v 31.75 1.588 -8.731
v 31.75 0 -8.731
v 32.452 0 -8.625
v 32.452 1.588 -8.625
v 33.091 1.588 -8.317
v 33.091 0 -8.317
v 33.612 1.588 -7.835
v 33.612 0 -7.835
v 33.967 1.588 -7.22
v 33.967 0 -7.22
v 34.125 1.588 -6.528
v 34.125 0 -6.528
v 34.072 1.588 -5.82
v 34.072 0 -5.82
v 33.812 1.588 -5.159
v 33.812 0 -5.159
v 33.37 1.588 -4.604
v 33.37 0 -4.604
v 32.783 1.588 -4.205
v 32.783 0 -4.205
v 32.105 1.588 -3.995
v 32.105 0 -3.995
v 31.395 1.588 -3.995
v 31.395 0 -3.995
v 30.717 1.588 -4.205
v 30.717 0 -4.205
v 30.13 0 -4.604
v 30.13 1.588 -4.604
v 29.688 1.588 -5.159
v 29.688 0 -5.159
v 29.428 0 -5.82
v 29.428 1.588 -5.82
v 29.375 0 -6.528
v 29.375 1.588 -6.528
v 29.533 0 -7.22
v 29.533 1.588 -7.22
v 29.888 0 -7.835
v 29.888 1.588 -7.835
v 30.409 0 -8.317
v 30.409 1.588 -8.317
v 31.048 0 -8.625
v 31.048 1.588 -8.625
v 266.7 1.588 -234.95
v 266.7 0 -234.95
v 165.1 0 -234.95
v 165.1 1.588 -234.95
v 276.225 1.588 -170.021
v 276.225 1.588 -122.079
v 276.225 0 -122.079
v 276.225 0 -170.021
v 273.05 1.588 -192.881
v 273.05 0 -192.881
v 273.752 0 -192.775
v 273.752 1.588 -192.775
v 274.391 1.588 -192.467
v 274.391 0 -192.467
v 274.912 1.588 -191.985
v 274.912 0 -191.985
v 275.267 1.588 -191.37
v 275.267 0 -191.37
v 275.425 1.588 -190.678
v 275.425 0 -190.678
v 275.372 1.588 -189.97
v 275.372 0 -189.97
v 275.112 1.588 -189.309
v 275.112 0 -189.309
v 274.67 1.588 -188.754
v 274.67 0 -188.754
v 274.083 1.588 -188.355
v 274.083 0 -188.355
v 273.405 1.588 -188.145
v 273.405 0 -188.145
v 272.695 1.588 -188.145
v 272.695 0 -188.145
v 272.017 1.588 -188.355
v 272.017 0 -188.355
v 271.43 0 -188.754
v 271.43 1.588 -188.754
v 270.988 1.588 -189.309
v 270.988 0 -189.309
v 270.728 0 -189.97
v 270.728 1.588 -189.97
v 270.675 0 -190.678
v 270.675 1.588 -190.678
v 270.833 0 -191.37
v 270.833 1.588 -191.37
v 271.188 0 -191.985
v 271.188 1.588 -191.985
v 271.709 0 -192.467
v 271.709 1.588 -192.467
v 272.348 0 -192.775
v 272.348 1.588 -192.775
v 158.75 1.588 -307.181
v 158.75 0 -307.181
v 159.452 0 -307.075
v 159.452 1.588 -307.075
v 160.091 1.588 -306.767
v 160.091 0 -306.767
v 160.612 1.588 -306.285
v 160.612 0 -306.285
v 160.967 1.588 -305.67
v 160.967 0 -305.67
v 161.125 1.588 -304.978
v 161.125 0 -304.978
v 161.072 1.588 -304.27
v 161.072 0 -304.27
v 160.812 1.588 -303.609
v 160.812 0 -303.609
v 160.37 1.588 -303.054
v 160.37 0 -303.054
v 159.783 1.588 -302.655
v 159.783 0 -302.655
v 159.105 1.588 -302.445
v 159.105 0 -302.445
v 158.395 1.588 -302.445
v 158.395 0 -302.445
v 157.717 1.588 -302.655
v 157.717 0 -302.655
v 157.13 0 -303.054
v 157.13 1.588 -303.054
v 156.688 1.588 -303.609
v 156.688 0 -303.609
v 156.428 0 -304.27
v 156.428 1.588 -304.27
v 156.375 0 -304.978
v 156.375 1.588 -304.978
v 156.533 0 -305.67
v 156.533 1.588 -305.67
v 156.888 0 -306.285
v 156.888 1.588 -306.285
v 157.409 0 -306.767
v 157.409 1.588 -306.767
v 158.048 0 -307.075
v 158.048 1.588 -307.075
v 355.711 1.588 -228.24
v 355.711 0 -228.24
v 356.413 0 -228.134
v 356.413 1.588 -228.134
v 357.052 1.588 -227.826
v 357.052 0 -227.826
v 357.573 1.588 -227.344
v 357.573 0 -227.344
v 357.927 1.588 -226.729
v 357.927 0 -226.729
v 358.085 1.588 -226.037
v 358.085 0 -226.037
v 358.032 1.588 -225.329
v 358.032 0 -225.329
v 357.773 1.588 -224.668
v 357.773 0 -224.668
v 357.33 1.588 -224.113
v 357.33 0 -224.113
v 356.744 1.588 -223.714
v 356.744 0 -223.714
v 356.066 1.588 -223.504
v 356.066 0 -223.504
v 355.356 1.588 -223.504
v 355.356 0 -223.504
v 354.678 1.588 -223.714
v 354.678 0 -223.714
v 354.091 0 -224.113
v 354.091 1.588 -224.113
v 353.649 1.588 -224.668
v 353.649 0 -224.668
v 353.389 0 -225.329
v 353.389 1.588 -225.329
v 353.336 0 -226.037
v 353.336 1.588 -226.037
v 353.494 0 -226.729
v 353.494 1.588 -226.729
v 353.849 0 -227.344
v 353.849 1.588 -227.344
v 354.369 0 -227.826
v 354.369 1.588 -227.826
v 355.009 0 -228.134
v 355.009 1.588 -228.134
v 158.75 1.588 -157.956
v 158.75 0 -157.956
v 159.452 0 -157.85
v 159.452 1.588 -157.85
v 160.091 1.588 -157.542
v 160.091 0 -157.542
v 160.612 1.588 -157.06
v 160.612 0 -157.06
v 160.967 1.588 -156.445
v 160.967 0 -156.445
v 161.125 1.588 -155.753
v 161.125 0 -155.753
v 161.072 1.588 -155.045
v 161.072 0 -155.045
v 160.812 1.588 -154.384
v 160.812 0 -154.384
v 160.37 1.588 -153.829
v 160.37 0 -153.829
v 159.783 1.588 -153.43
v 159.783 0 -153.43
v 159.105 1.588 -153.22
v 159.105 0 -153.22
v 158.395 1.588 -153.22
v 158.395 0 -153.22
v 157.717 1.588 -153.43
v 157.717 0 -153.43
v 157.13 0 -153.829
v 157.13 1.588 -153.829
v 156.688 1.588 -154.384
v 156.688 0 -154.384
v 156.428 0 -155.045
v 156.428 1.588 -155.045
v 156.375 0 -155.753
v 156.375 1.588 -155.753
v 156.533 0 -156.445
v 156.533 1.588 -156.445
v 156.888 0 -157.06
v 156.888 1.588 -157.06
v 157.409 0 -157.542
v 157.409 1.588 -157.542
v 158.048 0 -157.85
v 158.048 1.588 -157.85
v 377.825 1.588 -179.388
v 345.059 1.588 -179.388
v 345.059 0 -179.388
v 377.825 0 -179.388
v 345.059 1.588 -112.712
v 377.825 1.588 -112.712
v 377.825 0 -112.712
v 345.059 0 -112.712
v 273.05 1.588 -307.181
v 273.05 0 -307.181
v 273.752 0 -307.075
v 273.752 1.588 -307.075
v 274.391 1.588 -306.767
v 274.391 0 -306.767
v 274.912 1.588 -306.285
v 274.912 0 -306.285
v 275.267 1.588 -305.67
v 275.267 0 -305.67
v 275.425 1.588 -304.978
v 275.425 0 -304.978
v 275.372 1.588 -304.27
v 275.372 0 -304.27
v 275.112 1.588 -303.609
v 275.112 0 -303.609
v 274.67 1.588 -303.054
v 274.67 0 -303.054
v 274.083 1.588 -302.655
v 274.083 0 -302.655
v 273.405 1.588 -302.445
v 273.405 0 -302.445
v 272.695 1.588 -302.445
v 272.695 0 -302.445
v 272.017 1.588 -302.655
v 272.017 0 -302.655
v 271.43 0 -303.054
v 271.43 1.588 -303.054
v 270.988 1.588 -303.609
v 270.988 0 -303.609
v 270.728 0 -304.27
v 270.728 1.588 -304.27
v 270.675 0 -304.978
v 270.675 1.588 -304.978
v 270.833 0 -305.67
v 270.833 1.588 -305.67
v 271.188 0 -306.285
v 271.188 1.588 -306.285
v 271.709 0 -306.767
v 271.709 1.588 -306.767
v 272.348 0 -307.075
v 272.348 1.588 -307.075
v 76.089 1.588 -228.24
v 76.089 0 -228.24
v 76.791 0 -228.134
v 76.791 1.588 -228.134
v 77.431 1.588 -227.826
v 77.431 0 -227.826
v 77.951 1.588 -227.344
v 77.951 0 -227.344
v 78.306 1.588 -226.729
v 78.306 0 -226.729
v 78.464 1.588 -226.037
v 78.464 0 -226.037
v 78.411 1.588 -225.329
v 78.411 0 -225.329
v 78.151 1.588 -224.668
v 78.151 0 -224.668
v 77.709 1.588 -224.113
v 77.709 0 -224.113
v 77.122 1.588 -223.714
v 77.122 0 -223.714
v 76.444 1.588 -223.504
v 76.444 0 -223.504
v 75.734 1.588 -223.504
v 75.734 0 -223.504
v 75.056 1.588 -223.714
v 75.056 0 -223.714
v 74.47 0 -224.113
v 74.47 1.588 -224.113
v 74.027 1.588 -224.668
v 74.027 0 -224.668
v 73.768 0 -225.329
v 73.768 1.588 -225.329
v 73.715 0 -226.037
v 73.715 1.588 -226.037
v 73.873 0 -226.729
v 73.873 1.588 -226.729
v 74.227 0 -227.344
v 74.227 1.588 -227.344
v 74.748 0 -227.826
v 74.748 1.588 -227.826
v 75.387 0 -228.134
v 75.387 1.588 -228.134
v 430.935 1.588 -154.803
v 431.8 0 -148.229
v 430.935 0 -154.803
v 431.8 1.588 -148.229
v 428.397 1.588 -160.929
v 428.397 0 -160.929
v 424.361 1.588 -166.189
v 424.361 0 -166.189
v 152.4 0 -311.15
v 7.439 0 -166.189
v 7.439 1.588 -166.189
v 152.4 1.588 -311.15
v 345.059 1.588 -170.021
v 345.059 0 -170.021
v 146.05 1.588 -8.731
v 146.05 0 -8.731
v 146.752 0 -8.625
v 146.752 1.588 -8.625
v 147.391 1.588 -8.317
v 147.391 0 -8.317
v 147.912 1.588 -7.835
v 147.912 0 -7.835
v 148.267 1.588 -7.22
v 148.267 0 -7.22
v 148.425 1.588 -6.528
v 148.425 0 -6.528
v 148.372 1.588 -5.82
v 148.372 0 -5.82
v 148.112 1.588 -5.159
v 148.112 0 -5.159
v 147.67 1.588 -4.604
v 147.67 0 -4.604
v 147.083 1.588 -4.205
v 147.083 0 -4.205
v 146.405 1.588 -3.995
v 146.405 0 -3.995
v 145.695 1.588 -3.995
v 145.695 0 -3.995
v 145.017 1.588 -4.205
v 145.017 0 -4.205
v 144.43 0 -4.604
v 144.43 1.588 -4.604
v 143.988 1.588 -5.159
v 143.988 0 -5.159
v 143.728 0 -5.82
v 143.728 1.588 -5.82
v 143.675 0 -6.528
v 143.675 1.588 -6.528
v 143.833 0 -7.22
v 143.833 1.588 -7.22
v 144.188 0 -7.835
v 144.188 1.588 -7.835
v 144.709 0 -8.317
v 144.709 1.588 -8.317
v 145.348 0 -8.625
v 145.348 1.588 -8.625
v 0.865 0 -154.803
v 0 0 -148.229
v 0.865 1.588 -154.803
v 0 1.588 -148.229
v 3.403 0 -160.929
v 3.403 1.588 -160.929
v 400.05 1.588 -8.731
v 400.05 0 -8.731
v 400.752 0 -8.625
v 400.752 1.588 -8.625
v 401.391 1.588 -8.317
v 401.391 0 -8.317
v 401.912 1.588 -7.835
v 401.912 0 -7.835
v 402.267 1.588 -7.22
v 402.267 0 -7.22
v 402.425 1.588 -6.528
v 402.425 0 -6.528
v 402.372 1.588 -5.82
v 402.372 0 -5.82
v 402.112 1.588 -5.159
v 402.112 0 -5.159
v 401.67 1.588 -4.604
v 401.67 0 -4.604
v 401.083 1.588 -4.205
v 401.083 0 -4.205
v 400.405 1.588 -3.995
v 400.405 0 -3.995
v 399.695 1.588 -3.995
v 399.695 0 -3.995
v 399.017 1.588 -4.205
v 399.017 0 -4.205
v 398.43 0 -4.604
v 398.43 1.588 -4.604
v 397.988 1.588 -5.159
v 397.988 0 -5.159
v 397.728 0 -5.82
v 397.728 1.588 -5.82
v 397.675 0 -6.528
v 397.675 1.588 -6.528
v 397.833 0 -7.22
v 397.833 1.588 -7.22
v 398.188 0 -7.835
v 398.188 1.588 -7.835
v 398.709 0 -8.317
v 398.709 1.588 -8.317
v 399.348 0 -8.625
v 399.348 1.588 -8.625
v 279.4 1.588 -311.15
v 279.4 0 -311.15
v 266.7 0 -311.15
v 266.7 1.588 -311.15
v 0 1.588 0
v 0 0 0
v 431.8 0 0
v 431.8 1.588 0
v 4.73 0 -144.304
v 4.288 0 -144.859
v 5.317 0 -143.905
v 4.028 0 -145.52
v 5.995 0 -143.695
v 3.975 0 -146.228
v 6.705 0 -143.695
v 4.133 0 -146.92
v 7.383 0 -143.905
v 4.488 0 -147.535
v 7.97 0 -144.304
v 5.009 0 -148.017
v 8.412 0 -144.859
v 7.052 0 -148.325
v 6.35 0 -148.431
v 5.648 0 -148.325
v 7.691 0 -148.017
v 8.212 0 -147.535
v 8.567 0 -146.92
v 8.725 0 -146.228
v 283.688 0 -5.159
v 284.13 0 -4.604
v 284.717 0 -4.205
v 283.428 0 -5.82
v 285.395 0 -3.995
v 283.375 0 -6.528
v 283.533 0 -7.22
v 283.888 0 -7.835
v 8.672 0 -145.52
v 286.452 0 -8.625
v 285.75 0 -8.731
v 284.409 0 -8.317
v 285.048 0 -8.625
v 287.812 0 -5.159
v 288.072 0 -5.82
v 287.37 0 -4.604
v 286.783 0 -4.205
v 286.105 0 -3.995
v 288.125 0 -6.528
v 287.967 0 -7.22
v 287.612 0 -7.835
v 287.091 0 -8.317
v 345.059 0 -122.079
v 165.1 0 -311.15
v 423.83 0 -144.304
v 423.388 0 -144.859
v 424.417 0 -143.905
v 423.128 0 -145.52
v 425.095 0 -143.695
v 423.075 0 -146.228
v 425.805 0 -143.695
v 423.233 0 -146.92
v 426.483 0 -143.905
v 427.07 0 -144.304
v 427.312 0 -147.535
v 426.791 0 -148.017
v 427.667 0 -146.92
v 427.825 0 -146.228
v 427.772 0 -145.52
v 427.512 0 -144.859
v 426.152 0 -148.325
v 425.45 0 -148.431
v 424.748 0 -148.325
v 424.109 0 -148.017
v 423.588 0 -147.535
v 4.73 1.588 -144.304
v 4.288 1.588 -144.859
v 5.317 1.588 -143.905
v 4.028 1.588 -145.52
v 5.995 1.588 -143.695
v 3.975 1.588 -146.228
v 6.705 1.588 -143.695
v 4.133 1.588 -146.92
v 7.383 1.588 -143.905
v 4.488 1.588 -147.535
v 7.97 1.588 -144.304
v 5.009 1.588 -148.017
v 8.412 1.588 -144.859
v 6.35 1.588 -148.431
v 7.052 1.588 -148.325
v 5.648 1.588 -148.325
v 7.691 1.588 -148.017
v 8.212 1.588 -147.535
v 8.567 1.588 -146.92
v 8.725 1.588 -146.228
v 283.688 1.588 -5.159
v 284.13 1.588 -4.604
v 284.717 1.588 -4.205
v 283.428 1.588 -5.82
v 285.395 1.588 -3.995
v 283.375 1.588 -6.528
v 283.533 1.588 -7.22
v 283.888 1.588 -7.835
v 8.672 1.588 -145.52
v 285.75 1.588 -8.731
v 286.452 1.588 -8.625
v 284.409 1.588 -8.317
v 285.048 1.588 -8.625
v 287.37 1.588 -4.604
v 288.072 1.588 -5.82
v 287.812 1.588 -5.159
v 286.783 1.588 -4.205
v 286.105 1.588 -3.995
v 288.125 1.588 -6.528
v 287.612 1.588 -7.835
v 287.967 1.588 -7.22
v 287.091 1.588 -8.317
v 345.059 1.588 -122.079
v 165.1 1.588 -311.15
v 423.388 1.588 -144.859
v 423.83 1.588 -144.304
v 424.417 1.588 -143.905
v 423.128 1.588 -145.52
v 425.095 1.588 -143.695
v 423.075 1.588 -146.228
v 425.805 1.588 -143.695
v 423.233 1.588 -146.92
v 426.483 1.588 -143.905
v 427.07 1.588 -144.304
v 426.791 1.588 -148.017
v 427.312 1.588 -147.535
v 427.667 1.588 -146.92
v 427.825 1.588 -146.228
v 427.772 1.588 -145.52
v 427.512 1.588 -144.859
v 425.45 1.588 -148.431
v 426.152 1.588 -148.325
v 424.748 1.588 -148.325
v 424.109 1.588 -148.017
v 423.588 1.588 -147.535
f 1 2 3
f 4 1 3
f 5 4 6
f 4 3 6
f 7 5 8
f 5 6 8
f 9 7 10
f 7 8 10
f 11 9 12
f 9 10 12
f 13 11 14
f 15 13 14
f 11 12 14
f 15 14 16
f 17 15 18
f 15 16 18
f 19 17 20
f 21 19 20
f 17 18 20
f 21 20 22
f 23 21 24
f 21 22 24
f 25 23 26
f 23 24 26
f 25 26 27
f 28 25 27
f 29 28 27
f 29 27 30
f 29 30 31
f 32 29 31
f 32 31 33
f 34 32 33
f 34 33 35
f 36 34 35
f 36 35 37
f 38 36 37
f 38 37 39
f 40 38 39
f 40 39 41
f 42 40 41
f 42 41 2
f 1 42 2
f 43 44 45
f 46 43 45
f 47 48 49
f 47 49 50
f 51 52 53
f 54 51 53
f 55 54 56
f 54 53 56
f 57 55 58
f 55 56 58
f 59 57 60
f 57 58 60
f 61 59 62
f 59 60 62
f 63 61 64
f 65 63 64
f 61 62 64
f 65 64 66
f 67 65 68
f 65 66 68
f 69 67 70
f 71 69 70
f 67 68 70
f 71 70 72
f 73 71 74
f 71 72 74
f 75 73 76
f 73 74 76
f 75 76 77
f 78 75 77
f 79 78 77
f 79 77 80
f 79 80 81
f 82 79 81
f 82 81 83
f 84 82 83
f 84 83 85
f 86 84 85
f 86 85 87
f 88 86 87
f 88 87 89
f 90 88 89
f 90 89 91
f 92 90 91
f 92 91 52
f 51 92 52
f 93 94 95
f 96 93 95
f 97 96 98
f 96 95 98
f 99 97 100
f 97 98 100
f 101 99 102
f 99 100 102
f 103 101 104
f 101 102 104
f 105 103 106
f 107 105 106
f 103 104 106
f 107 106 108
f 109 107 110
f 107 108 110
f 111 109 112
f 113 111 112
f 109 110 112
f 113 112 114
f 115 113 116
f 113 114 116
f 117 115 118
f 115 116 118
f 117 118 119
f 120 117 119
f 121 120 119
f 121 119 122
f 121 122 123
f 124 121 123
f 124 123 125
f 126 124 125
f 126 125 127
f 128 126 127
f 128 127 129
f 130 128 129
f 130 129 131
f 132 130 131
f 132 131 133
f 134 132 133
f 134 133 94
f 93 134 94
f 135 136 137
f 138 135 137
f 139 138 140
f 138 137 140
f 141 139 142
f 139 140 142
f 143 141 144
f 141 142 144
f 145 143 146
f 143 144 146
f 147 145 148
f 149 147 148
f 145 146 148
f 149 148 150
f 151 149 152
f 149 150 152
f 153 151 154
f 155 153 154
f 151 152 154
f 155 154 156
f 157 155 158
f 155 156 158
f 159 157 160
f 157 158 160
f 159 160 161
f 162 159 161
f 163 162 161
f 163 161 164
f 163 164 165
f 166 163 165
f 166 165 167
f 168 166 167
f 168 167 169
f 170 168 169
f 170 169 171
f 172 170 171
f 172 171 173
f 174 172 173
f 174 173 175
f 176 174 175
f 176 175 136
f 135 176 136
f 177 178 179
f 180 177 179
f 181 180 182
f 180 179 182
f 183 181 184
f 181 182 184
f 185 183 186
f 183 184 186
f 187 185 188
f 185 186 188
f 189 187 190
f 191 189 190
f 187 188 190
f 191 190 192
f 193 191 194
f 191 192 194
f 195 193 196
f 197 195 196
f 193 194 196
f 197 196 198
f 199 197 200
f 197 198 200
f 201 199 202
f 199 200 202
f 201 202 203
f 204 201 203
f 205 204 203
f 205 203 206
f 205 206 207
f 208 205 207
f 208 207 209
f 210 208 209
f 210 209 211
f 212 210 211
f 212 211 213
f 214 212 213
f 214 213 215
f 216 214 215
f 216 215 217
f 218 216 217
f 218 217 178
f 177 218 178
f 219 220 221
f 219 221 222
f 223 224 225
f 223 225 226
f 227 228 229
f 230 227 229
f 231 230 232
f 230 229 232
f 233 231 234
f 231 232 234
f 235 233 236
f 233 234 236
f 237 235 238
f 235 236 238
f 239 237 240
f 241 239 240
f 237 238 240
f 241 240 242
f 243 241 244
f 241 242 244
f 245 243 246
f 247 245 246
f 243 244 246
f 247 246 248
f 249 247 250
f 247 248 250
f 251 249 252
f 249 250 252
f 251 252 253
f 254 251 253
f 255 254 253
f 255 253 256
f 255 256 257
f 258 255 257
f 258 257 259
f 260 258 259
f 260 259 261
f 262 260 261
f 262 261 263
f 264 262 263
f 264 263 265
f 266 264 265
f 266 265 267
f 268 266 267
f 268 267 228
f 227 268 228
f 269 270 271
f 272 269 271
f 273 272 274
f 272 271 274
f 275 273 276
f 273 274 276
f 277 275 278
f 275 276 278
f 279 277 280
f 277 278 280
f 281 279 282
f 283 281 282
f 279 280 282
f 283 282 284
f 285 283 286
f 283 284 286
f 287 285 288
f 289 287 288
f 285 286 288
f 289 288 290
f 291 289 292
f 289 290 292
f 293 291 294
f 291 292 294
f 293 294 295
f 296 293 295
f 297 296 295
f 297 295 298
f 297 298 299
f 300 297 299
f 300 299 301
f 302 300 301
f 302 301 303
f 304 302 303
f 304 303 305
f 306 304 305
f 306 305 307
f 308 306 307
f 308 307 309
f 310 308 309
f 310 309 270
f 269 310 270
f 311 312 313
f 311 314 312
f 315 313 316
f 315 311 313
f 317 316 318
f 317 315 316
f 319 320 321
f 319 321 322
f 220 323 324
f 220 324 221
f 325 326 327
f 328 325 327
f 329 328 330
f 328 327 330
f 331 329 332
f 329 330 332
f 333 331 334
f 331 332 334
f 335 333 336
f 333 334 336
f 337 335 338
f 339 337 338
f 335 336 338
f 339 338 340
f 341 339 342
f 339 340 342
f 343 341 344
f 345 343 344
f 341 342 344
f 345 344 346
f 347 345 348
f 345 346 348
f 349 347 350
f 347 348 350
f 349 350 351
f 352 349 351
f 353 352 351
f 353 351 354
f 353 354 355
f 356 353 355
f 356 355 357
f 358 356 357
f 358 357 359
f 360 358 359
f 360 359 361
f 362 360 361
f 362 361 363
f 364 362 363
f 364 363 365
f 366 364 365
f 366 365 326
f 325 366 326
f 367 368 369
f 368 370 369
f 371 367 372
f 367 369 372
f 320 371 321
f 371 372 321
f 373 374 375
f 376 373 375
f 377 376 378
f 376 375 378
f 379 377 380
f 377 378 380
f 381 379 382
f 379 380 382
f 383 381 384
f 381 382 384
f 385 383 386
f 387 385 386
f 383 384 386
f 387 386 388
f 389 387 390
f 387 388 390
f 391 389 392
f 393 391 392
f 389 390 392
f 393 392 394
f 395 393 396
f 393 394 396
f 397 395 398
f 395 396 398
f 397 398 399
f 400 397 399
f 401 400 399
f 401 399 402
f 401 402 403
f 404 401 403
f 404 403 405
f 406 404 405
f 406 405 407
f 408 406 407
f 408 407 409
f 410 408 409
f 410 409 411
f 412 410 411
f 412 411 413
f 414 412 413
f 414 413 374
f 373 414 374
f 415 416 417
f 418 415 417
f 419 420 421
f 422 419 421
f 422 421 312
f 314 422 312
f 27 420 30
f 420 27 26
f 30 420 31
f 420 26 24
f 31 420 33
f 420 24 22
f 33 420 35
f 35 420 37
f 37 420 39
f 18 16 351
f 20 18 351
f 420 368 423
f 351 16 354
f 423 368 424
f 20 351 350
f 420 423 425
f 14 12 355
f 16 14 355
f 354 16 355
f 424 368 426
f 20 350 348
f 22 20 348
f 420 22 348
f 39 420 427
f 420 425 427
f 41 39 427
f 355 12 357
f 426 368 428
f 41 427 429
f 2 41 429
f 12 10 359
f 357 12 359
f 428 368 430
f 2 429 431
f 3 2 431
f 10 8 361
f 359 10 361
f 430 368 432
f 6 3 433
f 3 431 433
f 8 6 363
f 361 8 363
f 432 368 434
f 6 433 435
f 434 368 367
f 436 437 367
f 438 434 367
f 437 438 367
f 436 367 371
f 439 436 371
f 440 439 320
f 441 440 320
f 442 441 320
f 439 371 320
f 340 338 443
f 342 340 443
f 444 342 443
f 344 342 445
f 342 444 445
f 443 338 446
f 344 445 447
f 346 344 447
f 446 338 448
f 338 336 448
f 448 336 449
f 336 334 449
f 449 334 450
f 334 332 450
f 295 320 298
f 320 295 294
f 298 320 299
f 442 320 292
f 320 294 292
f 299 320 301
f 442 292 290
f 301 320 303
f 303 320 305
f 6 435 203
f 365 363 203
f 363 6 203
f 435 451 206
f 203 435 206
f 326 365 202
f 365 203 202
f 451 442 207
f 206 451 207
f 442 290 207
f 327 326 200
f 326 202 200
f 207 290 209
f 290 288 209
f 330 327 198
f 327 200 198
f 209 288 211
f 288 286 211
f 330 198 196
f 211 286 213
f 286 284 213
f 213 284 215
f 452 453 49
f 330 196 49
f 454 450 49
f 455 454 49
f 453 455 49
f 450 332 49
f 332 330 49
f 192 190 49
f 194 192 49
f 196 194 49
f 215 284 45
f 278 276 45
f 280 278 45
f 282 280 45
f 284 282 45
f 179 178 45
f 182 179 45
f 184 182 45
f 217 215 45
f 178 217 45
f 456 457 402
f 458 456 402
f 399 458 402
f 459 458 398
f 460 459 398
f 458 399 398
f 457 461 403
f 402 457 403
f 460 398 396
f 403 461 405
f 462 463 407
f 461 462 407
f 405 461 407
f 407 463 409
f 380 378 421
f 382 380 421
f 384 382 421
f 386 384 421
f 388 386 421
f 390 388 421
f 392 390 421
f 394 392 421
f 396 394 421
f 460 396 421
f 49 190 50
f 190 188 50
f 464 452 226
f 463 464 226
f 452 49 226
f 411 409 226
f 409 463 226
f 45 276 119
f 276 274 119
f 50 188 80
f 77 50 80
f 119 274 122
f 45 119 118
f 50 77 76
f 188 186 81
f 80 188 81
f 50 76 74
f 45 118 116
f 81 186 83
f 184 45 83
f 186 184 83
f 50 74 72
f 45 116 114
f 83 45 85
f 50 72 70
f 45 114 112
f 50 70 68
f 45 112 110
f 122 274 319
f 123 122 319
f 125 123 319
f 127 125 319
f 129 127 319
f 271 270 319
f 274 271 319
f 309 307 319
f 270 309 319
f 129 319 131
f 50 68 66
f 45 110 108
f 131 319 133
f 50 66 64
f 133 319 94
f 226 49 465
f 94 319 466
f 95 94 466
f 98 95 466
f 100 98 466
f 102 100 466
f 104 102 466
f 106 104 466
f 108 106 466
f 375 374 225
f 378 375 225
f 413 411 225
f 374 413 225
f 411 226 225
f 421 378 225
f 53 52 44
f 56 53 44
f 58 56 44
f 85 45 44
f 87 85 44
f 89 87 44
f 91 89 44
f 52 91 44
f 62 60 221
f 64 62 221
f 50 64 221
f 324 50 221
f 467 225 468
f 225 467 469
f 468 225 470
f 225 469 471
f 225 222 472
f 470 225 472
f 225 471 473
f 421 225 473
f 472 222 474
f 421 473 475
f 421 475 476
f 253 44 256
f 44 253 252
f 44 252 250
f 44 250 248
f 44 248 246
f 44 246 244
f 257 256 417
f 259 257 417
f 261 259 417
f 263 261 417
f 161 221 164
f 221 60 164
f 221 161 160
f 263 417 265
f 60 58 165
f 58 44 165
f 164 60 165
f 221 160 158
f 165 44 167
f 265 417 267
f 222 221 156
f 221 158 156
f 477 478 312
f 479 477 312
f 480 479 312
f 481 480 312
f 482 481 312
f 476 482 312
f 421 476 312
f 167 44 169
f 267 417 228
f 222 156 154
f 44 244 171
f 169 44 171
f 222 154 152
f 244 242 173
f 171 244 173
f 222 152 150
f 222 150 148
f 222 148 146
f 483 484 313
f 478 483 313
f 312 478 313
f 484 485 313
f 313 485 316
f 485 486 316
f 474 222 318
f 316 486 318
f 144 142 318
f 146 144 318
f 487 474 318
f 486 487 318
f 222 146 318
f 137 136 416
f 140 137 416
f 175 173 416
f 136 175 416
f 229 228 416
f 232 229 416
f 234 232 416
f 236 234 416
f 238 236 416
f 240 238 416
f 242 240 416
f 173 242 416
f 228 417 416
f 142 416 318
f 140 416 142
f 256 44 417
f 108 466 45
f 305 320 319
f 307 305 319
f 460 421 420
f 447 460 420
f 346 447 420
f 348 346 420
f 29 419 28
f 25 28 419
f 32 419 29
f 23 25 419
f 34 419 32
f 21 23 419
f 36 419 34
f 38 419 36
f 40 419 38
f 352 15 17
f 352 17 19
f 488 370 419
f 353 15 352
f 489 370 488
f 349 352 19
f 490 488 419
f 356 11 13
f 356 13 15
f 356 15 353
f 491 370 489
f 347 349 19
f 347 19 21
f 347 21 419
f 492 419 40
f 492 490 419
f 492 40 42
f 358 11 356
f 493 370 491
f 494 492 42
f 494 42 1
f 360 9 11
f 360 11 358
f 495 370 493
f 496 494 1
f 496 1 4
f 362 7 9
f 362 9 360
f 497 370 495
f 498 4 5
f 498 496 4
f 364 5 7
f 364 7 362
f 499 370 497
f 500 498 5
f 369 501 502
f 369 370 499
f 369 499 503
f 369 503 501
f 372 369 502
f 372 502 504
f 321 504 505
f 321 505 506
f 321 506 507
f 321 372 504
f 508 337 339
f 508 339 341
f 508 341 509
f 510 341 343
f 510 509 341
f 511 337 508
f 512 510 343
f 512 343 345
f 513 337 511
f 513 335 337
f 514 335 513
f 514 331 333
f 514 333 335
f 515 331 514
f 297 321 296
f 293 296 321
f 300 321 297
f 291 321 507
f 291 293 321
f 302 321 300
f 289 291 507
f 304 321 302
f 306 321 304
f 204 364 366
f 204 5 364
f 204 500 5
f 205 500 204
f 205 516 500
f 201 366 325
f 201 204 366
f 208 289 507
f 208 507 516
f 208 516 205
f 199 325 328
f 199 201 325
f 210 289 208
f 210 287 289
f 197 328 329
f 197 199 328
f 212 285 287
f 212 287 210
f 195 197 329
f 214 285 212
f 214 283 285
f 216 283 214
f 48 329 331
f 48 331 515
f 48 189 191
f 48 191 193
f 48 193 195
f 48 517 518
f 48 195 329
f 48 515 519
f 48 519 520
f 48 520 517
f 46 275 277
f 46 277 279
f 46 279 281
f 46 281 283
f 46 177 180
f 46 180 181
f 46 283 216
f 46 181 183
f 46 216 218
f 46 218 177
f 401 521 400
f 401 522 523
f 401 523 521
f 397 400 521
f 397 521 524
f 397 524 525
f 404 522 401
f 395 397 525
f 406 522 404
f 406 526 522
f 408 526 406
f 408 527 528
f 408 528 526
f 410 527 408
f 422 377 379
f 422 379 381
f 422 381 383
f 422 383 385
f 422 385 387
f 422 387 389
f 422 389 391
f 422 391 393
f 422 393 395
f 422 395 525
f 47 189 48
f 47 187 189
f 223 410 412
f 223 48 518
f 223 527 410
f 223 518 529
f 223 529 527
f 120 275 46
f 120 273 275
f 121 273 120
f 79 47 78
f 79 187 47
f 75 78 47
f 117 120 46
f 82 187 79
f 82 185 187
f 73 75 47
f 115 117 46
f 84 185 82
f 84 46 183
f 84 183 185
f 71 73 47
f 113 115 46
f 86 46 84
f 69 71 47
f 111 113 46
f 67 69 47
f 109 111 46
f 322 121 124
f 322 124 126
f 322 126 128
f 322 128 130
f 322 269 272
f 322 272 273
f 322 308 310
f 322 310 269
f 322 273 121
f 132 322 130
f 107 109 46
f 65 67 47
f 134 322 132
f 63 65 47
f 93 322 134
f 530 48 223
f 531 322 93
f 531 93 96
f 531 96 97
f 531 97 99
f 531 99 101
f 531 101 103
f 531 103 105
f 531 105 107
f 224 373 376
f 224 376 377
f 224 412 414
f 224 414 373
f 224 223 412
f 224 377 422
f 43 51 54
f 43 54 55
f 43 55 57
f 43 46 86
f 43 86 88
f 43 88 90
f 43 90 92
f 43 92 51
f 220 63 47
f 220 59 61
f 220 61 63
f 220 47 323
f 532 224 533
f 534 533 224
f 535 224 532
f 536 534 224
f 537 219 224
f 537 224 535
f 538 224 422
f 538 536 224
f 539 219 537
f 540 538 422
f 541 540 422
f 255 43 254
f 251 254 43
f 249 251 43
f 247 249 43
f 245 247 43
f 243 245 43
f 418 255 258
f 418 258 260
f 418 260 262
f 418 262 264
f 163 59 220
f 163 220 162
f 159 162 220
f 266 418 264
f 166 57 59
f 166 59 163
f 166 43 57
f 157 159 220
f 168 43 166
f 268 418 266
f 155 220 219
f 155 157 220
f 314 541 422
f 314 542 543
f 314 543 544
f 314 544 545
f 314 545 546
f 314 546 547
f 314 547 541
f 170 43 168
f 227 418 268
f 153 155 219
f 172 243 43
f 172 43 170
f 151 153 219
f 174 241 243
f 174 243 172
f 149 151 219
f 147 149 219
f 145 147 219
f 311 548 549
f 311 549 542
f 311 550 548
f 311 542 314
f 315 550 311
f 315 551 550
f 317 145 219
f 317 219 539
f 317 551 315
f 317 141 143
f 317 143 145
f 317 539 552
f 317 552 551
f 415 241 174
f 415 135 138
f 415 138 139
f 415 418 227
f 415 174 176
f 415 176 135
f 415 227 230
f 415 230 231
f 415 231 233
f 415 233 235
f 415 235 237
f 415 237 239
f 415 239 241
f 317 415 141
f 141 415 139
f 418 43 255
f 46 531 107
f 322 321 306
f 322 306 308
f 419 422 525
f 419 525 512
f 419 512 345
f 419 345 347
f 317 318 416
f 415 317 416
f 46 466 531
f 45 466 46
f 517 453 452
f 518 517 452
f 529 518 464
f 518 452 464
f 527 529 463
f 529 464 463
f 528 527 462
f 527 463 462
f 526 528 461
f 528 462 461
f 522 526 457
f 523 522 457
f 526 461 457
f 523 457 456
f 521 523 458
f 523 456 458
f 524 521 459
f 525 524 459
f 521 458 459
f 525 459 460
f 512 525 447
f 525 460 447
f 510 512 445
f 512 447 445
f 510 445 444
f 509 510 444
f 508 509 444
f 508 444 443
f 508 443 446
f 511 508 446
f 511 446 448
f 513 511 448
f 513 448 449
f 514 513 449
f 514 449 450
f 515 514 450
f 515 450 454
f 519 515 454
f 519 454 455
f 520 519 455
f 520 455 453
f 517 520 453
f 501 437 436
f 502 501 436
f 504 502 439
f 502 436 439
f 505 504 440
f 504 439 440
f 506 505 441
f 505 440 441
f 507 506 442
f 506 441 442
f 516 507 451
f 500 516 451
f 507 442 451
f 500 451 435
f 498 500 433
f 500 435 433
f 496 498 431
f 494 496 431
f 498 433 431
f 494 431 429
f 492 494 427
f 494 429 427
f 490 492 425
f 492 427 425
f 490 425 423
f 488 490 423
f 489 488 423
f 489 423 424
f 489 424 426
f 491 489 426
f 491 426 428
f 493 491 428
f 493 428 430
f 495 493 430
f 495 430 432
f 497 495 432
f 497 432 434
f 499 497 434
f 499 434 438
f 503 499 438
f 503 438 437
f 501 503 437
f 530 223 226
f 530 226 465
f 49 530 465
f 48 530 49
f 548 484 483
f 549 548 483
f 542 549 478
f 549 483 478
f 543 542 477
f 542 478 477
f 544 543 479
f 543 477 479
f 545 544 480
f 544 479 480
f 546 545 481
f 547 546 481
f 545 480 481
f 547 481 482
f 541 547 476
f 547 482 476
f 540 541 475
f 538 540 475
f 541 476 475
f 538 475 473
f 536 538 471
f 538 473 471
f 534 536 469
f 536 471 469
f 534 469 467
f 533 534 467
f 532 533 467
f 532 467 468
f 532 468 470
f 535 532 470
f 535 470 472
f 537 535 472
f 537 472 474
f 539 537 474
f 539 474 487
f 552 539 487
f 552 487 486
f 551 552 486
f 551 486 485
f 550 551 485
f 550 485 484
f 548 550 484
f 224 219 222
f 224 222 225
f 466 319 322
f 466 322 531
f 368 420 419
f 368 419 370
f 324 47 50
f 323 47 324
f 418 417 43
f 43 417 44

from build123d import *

# Parameters (mm, degrees)
EXTRUDE1_DEPTH     = 1.5875
MIRROR1_DEPTH      = 1.5875
CUT_EXTRUDE1_REACH = 534.229
SKETCH3_R          = 2.38125
CUT_EXTRUDE2_DEPTH = 533.229351555
FILLET1_R          = 25.4


# Read off the part's stored shape, not the designer's step: Mirror1
with BuildPart() as part:
    # Sketch1 → Extrude1 (new body)
    with BuildSketch(Plane(origin=(0, 0, 0), x_dir=(1, 0, 0), z_dir=(0, 1, 0))):
        Polygon((0, 0), (0, 158.75), (152.4, 311.15), (165.1, 311.15), (165.1, 234.95), (215.9, 234.95), (215.9, 0), align=None)
    extrude(amount=EXTRUDE1_DEPTH)

    # Mirror1 outline → Mirror1 (add)
    with BuildSketch(Plane(origin=(0, 0, 0), x_dir=(1, 0, 0), z_dir=(0, 1, 0))):
        Polygon((215.9, 0), (431.8, 0), (431.8, 158.75), (279.4, 311.15), (266.7, 311.15), (266.7, 234.95), (215.9, 234.95), align=None)
    extrude(amount=MIRROR1_DEPTH)

    # Sketch2 → Cut-Extrude1 (cut, up to next)
    with BuildSketch(Plane(origin=(0, 1.5875, 0), x_dir=(-1, 0, 0), z_dir=(0, 1, 0)), mode=Mode.PRIVATE) as cut_extrude1_sk1:
        Polygon((-276.225, -170.020724332), (-345.059, -170.020724332), (-345.059, -179.3875), (-377.825, -179.3875), (-377.825, -112.7125), (-345.059, -112.7125), (-345.059, -122.079275668), (-276.225, -122.079275668), align=None)
    cut_extrude1_tool1 = extrude(cut_extrude1_sk1.sketch, amount=-CUT_EXTRUDE1_REACH, mode=Mode.PRIVATE) & part.part
    add(cut_extrude1_tool1.solids().sort_by_distance((330.876817, 1.5875, -146.05))[0], mode=Mode.SUBTRACT)

    # Sketch3 → Cut-Extrude2 (cut, through all)
    with BuildSketch(Plane.XZ):
        with Locations(Location((400.05, -6.35, 0), (0, 0, 270))):
            Circle(SKETCH3_R)
        with Locations(Location((425.45, -146.05, 0), (0, 0, 270))):
            Circle(SKETCH3_R)
        with Locations(Location((355.710774635, -225.858969244, 0), (0, 0, 270))):
            Circle(SKETCH3_R)
        with Locations(Location((273.05, -304.8, 0), (0, 0, 270))):
            Circle(SKETCH3_R)
        with Locations(Location((273.05, -190.5, 0), (0, 0, 270))):
            Circle(SKETCH3_R)
        with Locations(Location((285.75, -6.35, 0), (0, 0, 270))):
            Circle(SKETCH3_R)
        with Locations(Location((158.75, -304.8, 0), (0, 0, 270))):
            Circle(SKETCH3_R)
        with Locations(Location((158.75, -155.575, 0), (0, 0, 270))):
            Circle(SKETCH3_R)
        with Locations(Location((146.05, -6.35, 0), (0, 0, 270))):
            Circle(SKETCH3_R)
        with Locations(Location((31.75, -6.35, 0), (0, 0, 270))):
            Circle(SKETCH3_R)
        with Locations(Location((6.35, -146.05, 0), (0, 0, 270))):
            Circle(SKETCH3_R)
        with Locations(Location((76.089225365, -225.858969244, 0), (0, 0, 270))):
            Circle(SKETCH3_R)
    extrude(amount=-CUT_EXTRUDE2_DEPTH, mode=Mode.SUBTRACT)

    # Fillet1
    fillet1_edges = [part.edges().sort_by_distance(p)[0] for p in [
        (0, 0.79375, -158.75),
        (431.8, 0.79375, -158.75),
    ]]
    fillet(fillet1_edges, radius=FILLET1_R)


solid = part.part
